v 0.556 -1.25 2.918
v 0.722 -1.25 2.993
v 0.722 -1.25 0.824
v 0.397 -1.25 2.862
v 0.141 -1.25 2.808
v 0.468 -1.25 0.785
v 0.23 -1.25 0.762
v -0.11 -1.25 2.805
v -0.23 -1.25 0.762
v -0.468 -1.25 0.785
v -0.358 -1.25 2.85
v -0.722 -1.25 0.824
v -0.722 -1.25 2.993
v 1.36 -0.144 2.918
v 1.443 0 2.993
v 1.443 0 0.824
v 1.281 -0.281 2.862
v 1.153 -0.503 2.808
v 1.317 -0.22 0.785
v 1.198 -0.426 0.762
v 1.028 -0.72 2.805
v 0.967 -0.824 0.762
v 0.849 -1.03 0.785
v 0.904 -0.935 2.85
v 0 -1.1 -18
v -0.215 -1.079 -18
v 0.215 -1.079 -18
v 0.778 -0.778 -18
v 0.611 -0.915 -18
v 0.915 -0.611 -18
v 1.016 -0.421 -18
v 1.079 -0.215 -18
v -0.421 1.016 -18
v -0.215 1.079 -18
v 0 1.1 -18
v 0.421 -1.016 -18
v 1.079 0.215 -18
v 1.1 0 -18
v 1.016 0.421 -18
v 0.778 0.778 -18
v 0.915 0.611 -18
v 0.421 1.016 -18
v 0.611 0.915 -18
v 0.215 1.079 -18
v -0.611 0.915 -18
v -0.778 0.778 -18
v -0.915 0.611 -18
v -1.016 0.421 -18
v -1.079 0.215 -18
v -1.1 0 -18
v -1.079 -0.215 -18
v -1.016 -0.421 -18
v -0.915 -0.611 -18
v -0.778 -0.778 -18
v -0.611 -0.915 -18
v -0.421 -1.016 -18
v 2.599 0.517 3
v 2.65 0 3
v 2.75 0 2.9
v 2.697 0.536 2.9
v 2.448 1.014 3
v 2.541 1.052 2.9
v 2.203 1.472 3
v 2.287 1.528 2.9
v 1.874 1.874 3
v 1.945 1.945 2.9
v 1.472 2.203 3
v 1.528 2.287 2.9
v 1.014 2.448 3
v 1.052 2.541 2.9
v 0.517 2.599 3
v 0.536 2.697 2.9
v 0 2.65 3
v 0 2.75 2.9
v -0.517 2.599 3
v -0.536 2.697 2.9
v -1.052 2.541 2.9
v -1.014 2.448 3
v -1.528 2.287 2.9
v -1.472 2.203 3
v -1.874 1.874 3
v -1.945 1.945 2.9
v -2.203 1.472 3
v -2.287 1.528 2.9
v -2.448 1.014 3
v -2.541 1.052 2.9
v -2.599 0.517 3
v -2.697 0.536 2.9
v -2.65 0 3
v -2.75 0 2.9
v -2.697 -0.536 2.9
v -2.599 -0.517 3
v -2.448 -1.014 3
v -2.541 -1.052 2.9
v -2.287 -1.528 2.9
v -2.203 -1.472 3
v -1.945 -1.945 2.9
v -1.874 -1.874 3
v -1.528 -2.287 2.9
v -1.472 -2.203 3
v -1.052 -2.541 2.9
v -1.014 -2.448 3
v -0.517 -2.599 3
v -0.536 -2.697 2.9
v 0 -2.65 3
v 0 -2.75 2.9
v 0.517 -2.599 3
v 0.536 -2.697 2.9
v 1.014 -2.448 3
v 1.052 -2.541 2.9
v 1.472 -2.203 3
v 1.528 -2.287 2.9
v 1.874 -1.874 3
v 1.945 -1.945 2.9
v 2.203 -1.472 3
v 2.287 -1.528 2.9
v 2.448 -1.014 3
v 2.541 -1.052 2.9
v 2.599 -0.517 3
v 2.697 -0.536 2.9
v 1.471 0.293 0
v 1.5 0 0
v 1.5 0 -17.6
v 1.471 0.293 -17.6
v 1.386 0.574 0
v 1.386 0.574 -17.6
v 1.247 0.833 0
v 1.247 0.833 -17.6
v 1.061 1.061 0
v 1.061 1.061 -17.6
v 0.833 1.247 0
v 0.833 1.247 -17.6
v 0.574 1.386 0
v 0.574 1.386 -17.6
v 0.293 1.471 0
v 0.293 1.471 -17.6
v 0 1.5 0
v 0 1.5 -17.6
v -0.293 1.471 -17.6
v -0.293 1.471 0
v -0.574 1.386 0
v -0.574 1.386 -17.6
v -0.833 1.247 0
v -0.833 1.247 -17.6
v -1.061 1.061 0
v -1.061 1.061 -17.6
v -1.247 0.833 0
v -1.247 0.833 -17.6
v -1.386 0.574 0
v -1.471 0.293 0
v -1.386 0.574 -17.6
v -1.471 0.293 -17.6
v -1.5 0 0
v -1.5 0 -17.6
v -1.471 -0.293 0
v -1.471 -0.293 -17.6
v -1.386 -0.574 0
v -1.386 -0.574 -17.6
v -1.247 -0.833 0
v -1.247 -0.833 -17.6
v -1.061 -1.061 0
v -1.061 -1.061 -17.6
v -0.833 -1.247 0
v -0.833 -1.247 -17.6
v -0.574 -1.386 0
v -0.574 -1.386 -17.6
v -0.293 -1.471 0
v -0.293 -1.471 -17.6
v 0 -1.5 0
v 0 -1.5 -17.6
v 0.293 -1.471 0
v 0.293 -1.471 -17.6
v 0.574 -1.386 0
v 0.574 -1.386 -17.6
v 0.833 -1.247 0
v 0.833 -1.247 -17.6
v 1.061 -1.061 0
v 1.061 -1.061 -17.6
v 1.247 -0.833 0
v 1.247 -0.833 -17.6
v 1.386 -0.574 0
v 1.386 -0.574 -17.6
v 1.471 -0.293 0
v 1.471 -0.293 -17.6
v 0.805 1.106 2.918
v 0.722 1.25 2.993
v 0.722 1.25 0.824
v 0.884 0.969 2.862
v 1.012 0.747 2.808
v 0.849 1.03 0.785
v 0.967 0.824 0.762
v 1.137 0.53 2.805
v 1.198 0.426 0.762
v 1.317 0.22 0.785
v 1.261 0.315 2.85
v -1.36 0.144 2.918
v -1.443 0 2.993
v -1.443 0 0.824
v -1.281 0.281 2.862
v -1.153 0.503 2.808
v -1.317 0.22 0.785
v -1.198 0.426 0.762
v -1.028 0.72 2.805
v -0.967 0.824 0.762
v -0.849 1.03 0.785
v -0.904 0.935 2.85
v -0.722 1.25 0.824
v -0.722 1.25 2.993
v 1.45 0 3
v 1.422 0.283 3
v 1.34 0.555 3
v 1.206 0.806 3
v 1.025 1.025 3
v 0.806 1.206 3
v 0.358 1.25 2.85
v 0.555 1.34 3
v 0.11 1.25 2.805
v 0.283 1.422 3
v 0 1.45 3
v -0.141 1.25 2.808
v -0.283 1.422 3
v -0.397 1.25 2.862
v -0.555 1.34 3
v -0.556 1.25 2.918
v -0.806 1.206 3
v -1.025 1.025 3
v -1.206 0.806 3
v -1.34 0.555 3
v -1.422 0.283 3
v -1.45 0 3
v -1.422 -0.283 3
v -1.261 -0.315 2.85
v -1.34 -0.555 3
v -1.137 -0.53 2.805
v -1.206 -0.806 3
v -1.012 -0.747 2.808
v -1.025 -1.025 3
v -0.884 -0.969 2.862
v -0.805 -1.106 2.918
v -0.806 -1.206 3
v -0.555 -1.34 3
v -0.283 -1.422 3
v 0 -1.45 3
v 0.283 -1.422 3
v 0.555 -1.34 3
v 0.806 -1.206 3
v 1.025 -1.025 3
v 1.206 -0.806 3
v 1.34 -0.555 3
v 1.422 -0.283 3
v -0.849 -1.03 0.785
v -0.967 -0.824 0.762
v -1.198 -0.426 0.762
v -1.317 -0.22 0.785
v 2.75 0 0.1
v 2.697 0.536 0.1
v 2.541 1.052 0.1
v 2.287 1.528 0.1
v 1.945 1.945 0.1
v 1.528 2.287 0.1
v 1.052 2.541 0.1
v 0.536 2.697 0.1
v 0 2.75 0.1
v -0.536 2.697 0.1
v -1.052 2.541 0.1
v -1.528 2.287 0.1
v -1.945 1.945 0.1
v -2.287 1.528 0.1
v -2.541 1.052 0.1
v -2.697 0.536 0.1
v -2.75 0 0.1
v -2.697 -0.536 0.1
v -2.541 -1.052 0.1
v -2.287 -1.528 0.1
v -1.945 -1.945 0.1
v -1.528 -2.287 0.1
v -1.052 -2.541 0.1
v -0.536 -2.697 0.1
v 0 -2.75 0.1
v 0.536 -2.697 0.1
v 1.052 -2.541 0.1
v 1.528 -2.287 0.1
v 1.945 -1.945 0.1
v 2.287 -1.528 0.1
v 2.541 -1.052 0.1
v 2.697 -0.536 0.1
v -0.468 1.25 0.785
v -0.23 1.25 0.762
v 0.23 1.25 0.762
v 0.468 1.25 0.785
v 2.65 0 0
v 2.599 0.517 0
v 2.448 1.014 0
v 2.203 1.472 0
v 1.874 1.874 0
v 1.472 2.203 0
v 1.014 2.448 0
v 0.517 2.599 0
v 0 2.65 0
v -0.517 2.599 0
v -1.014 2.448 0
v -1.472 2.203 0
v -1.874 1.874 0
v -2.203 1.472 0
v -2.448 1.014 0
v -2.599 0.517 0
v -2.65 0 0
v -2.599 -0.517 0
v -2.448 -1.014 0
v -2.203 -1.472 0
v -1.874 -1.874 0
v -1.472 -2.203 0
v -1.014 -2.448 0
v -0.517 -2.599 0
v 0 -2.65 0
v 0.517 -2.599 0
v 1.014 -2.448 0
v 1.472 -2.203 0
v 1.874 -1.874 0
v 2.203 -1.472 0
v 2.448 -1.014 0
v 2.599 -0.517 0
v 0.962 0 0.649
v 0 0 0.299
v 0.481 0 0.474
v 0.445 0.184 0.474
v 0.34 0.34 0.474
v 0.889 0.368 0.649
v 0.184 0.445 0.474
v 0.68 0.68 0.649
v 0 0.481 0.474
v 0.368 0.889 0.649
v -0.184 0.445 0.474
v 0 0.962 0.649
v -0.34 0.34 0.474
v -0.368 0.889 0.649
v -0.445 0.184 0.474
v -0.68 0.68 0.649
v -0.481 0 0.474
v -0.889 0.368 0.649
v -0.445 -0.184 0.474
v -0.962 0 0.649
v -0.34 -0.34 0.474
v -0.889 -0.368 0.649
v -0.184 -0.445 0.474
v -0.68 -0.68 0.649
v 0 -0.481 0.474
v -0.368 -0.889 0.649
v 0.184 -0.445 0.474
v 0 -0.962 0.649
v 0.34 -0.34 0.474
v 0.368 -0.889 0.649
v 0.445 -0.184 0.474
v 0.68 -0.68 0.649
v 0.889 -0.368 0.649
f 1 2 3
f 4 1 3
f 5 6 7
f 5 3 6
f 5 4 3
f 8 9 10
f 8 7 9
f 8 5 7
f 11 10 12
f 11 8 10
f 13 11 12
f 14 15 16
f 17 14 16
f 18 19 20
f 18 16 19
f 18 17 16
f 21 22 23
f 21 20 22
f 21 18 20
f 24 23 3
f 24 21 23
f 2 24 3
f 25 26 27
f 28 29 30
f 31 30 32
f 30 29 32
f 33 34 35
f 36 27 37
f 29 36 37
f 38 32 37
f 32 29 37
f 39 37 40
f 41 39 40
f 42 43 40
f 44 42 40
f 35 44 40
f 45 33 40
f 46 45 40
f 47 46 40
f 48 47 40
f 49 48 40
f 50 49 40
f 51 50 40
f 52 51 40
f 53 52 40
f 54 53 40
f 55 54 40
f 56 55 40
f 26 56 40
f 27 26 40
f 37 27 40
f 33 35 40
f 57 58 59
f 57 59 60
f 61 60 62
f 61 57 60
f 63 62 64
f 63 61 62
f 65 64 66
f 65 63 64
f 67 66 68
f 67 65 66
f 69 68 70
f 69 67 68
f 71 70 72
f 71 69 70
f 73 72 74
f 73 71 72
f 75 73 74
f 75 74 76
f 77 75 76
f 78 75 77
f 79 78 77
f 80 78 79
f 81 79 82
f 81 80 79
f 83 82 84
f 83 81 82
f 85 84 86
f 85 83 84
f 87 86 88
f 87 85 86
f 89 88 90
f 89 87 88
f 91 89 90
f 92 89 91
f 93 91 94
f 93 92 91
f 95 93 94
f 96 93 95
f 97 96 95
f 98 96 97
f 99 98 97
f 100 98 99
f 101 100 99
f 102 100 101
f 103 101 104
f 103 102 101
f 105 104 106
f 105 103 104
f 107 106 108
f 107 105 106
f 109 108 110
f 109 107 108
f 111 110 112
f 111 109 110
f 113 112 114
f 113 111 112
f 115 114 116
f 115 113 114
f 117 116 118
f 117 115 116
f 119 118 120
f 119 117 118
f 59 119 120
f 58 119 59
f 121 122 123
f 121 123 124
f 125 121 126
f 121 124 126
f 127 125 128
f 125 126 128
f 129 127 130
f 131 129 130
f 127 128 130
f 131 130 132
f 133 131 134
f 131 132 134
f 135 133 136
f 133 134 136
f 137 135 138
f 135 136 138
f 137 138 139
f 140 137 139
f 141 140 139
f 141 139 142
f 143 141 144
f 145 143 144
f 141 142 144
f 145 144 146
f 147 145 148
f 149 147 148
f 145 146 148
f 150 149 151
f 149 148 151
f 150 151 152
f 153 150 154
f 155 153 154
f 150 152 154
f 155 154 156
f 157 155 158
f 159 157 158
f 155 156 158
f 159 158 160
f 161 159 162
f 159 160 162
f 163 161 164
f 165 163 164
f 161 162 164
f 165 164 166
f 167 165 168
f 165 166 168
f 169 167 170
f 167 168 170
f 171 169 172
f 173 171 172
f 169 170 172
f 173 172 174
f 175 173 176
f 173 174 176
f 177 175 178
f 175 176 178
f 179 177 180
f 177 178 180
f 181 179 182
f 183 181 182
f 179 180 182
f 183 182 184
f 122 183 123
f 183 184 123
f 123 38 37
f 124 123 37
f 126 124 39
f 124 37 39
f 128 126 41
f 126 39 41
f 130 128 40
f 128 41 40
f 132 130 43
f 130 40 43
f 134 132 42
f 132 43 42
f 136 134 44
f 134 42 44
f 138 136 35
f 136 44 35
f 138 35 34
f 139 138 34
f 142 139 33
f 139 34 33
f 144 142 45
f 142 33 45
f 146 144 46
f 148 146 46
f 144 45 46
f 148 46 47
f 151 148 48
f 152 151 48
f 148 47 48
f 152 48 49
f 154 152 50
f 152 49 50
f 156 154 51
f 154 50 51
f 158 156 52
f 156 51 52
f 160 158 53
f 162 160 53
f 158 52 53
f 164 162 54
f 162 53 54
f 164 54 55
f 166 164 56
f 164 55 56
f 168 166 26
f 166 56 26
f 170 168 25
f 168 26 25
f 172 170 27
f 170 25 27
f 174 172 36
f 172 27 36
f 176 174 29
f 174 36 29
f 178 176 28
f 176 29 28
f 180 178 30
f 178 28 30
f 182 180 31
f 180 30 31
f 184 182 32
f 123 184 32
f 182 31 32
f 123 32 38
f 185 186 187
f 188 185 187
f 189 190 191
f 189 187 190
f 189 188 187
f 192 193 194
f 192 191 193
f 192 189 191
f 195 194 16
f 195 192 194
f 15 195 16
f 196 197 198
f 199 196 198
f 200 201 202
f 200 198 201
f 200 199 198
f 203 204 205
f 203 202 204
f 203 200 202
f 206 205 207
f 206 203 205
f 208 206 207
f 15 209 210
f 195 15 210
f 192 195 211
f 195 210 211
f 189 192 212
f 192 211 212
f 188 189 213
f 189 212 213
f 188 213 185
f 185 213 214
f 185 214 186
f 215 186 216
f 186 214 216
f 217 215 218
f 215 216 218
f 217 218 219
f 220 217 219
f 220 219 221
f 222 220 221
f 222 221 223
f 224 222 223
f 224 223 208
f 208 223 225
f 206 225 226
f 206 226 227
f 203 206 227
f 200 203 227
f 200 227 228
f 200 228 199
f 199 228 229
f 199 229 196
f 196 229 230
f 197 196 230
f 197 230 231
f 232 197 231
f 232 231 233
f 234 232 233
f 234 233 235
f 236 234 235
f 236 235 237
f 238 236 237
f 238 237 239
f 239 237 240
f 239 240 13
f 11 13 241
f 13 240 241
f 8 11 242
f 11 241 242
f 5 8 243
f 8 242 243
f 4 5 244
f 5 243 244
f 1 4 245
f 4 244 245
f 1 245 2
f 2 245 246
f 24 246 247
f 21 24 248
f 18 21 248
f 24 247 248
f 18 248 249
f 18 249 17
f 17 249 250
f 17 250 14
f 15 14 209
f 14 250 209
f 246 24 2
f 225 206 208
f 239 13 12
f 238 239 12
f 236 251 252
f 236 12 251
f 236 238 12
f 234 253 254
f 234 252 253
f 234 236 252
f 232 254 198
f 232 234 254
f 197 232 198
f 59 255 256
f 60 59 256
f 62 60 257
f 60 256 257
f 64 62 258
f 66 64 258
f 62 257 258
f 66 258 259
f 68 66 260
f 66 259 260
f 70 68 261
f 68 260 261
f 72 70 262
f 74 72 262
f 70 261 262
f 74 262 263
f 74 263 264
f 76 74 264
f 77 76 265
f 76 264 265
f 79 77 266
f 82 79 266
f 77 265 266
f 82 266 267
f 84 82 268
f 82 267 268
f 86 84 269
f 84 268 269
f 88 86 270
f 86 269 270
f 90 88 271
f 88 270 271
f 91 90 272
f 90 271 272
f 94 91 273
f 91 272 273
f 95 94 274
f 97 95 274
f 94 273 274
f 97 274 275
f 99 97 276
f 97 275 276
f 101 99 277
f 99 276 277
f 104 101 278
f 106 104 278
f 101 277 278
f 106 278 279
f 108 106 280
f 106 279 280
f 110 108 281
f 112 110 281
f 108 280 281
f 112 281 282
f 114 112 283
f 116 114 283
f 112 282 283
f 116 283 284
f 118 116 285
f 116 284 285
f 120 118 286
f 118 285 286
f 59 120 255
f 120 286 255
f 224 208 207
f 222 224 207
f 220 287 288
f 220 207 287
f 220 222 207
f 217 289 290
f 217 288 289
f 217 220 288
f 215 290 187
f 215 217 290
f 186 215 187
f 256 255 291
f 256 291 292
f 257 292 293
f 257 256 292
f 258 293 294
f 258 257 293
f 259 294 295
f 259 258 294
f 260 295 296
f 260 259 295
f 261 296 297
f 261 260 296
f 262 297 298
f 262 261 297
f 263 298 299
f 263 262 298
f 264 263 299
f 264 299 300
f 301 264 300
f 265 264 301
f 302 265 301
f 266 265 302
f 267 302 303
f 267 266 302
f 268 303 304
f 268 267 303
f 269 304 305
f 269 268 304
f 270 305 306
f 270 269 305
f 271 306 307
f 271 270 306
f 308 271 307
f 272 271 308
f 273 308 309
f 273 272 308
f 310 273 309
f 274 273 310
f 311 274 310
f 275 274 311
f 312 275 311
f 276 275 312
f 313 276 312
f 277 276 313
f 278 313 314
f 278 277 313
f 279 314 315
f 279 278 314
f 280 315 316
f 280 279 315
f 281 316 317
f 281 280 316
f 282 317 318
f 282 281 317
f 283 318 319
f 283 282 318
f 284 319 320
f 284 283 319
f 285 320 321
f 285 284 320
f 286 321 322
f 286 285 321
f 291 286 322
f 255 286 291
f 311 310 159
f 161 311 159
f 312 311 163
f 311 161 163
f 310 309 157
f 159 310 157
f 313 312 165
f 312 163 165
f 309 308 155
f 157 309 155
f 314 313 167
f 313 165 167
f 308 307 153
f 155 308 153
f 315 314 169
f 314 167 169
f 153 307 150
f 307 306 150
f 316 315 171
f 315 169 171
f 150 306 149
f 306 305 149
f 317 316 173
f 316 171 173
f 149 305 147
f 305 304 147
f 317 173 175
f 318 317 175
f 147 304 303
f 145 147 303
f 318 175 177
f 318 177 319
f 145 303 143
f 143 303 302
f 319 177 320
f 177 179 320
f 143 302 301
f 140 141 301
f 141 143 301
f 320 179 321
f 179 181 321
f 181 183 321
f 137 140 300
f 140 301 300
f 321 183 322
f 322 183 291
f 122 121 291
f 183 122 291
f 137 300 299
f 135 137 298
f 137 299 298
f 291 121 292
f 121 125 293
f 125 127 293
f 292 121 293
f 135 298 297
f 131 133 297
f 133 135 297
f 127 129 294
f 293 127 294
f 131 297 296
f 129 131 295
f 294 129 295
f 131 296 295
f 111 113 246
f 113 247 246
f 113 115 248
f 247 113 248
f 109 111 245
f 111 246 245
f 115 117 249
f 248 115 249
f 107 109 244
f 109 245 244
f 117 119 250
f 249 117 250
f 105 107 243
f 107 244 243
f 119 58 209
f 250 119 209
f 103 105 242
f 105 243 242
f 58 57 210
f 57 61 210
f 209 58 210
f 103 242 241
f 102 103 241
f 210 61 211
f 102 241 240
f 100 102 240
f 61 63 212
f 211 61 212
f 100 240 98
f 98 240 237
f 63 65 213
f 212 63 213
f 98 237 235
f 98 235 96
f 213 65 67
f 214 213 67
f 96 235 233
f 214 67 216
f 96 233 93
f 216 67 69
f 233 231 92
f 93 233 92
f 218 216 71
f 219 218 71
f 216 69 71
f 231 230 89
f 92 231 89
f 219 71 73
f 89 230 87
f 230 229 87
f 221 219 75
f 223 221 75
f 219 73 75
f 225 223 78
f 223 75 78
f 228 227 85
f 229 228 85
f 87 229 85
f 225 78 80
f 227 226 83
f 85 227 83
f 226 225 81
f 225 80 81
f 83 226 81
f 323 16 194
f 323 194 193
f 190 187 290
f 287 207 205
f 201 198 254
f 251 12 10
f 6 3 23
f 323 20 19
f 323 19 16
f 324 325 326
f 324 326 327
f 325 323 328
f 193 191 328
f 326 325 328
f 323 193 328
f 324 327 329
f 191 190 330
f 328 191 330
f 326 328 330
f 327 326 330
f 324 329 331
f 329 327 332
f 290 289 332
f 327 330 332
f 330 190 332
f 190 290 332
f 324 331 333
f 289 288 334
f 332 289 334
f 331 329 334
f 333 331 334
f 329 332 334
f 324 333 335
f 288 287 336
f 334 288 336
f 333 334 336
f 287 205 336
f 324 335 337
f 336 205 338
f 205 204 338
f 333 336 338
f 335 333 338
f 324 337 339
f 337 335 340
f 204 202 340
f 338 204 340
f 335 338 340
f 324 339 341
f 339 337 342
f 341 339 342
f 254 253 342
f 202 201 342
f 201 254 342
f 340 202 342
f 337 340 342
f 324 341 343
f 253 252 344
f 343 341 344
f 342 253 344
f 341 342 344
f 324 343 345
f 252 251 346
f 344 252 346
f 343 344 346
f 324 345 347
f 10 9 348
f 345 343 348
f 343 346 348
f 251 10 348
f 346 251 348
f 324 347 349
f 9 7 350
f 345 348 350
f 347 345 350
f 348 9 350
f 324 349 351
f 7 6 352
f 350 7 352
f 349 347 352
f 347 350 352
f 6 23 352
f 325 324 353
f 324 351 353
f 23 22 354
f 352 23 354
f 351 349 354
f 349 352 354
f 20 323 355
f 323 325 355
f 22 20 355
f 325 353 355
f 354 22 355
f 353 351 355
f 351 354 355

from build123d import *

# Parameters (mm, degrees)
SKETCH001_R     = 3.75
POCKET_DEPTH    = 9.70192
CHAMFER_SIZE    = 0.4
CHAMFER001_SIZE = 0.1


with BuildPart() as pocket:
    # Sketch003 → Revolution001 (revolve)
    with BuildSketch(Plane.XZ):
        Polygon((0, 0.29908), (2.75, 1.3), (2.75, 10), (0, 10), align=None)
    revolve(axis=Axis((0, 0, 0), (0, 0, 1)))

    # Sketch001 → Pocket (cut, through all)
    with BuildSketch(Plane(origin=(0, 0, 10), x_dir=(-1, 0, 0), z_dir=(0, 0, 1))):
        Circle(SKETCH001_R)
        Polygon((-0.721688, 1.25), (0.721688, 1.25), (1.443376, 0), (0.721688, -1.25), (-0.721688, -1.25), (-1.443376, 0), align=None, mode=Mode.SUBTRACT)
    extrude(amount=-POCKET_DEPTH, mode=Mode.SUBTRACT)


with BuildPart() as chamfer001:
    # Sketch → Revolution (revolve)
    with BuildSketch(Plane.XZ):
        Polygon((1.45, 3), (2.75, 3), (2.75, 0), (1.5, 0), (1.5, -18), (0, -18), (0, 1.549999), align=None)
    revolve(axis=Axis((0, 0, 0), (0, 0, 1)))

    # Cut: cut Pocket
    add(pocket.part, mode=Mode.SUBTRACT)

    # Chamfer
    chamfer_edges = [chamfer001.edges().sort_by_distance(p)[0] for p in [
        (-1.5, 0, -18),
    ]]
    chamfer(chamfer_edges, length=CHAMFER_SIZE)

    # Chamfer001
    chamfer001_edges = [chamfer001.edges().sort_by_distance(p)[0] for p in [
        (-2.75, 0, 0),
        (-2.75, 0, 3),
    ]]
    chamfer(chamfer001_edges, length=CHAMFER001_SIZE)


solid = chamfer001.part
